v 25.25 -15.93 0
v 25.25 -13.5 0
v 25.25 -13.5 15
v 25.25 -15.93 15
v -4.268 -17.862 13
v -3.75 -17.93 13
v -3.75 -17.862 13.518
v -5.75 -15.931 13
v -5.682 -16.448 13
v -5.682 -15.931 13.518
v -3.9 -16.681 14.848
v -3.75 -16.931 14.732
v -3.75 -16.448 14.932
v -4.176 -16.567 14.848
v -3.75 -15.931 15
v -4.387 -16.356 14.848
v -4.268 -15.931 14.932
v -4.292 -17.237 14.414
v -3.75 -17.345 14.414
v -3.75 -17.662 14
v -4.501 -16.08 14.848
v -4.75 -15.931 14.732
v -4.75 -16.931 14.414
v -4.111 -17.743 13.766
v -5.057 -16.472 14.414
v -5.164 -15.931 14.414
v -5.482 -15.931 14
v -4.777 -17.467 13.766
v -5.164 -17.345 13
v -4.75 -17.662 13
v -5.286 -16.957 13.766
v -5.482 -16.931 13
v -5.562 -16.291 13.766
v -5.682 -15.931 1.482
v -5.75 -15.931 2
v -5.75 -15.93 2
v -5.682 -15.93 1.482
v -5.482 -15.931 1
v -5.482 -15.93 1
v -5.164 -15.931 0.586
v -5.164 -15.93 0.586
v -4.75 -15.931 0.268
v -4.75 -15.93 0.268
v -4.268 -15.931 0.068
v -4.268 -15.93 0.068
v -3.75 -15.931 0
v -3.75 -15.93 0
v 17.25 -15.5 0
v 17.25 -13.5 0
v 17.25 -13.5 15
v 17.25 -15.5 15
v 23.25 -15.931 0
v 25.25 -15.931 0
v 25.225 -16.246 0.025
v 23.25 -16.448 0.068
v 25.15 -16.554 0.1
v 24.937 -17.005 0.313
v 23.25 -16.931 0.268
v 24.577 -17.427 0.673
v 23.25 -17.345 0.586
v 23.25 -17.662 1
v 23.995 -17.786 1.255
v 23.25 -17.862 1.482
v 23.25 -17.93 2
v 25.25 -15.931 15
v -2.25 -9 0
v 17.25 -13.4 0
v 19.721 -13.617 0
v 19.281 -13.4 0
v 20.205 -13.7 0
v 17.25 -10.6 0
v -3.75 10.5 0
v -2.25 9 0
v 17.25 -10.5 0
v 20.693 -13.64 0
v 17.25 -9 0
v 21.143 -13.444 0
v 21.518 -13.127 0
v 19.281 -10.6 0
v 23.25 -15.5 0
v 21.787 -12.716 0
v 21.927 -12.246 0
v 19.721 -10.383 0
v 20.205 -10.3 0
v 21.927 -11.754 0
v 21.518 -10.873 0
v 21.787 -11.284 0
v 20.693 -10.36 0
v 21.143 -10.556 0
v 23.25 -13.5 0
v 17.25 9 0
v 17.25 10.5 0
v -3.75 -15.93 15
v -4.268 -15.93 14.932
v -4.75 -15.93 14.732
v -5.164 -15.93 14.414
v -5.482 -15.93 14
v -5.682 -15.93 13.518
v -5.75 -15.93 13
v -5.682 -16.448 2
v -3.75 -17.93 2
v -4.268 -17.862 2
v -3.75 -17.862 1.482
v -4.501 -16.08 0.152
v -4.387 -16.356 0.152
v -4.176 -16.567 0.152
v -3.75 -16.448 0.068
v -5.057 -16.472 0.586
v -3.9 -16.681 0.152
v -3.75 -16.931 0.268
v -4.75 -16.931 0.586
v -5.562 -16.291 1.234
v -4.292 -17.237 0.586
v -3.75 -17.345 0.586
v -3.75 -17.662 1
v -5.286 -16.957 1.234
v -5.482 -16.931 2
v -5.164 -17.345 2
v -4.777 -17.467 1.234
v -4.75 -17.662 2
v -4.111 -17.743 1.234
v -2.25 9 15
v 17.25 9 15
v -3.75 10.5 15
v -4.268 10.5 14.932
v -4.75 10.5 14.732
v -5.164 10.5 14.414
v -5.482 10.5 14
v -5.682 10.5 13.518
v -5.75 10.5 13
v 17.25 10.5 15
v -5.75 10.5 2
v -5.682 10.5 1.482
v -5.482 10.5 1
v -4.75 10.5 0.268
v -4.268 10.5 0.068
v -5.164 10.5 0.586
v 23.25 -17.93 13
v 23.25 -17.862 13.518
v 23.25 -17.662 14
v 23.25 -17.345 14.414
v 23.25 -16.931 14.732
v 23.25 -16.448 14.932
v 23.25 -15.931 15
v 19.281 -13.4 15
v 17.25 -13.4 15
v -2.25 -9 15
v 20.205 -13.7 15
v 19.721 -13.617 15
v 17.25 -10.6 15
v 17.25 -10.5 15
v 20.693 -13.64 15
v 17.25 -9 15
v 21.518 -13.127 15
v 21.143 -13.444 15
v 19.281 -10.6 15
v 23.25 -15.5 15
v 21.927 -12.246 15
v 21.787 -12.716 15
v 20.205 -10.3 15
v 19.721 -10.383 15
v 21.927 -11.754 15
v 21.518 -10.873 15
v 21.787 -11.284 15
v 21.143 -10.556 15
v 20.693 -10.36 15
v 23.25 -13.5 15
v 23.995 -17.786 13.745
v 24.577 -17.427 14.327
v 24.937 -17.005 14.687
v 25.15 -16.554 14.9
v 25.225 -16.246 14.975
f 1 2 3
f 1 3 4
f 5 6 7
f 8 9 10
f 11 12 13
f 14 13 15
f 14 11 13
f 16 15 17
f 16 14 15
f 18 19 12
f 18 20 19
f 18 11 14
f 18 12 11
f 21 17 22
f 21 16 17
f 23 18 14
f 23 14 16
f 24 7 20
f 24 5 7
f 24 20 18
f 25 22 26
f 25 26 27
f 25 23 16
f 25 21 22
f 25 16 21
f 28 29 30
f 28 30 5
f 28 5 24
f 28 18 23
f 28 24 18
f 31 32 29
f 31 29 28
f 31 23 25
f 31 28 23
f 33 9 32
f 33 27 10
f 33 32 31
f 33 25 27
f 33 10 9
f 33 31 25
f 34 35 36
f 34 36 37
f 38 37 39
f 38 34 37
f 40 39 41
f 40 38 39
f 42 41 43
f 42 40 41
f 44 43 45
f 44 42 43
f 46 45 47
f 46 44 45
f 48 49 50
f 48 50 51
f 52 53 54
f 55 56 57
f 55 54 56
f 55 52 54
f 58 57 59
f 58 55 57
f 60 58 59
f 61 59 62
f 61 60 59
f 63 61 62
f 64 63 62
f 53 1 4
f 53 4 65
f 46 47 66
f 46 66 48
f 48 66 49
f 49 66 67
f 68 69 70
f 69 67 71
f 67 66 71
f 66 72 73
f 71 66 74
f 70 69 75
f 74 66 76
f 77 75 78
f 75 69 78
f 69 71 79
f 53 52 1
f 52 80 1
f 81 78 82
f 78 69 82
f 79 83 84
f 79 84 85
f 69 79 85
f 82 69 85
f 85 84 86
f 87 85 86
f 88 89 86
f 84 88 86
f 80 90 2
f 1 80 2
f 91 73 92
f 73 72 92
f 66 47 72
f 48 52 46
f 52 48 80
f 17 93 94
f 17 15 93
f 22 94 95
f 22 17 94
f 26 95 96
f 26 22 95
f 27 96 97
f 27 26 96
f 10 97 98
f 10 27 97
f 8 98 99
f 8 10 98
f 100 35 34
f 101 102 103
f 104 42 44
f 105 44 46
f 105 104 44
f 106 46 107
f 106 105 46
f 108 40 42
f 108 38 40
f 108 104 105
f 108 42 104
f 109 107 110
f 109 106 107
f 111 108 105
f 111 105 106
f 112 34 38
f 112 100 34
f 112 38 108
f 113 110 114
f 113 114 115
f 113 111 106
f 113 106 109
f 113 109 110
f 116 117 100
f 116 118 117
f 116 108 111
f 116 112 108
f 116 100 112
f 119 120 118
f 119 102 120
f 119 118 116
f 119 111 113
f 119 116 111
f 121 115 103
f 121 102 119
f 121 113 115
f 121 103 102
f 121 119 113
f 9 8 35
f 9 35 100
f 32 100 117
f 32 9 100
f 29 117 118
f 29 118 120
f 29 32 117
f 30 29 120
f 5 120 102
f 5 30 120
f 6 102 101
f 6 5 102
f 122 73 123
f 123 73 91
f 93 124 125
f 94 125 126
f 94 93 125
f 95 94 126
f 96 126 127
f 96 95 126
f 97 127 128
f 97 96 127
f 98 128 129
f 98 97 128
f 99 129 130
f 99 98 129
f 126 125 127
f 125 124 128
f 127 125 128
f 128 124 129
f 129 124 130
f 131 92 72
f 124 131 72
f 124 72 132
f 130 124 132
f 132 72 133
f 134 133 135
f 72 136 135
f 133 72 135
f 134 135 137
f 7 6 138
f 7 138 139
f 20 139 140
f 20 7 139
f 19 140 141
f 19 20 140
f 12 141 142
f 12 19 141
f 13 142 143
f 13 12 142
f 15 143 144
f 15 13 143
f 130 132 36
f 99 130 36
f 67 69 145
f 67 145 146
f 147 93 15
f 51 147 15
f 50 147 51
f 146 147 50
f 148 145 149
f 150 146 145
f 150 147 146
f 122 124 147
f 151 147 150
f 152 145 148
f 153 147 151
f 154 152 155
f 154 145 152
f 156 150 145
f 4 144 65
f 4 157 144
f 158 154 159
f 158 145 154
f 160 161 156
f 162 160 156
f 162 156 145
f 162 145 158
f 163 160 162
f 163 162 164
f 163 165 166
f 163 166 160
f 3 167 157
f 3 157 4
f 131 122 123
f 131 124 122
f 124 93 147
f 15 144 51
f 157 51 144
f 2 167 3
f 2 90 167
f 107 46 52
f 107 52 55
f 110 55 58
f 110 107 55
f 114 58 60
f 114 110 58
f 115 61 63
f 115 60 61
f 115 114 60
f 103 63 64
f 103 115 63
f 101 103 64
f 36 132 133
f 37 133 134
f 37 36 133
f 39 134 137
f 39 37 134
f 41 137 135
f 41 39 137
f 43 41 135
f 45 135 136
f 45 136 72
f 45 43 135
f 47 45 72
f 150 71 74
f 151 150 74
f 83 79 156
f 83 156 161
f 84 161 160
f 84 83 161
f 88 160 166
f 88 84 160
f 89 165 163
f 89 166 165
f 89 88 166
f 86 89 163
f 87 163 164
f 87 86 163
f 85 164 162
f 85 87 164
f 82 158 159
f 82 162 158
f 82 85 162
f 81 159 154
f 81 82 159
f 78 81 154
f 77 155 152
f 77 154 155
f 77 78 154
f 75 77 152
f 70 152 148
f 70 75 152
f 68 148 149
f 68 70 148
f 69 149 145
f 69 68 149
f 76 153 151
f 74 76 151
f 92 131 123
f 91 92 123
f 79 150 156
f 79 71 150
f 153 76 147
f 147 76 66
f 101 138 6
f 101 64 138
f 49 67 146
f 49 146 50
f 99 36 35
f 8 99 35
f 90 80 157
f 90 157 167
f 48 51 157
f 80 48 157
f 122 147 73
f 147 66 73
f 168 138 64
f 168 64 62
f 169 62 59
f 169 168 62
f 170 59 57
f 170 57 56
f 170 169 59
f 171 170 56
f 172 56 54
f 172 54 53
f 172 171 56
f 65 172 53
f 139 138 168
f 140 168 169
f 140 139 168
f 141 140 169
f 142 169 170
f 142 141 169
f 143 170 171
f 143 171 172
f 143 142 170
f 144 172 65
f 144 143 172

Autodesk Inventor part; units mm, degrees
ref_plane "YZ Plane" through (0, 0, 0) normal (1, 0, 0) x (0, 1, 0)
ref_plane "XZ Plane" through (0, 0, 0) normal (0, 1, 0) x (-1, 0, 0)
ref_plane "XY Plane" through (0, 0, 0) normal (0, 0, 1) x (1, 0, 0)
sketch "Эскиз1" plane through (0, 0, 0) normal (0, 0, 1) x (1, 0, 0)
  arc A0 (19.25, -13.5) -> (19.25, -10.5) centre (20.245, -12) ccw projected
  line L0 (19.25, -10.5) -> (17.25, -10.5) projected
  line L1 (17.25, -13.5) -> (19.25, -13.5) projected
  line L2 (17.25, -10.6) -> (19.2806, -10.6)
  arc A1 (19.2806, -13.4) -> (19.2806, -10.6) centre (20.245, -12) ccw
  line L3 (19.2806, -13.4) -> (17.25, -13.4)
  line L4 (17.25, -13.5) -> (17.25, -15.5) projected
  line L5 (17.25, 3) -> (17.25, -10.5) projected
  line L6 (19.25, -9) -> (-2.25, -9) projected
  line L7 (-2.25, -9) -> (-2.25, 9) projected
  line L8 (-2.25, 9) -> (19.25, 9) projected
  line L9 (17.25, 10.5) -> (17.25, 6.5) projected
  line L10 (17.25, 10.5) -> (-5.75, 10.5)
  line L11 (-5.75, 10.5) -> (-5.75, -17.9303)
  line L12 (23.25, -17.9303) -> (-3.75, -17.9303) projected
  line L13 (-5.75, -15.9303) -> (-5.75, 10.5) projected
  line L14 (-5.75, -17.9303) -> (-3.75, -17.9303)
  line L15 (25.25, -13.5) -> (25.25, -15.9303) projected
  line L16 (23.25, -13.5) -> (25.25, -13.5) projected
  line L17 (23.25, -15.5) -> (23.25, -13.5) projected
  line L18 (23.25, -17.9303) -> (-3.75, -17.9303) projected
  line L19 (25.25, -15.9303) -> (25.25, -17.9303)
  line L20 (25.25, -17.9303) -> (23.25, -17.9303)
  line L21 (17.25, -15.5) -> (23.25, -15.5)
  line L22 (17.25, -13.4) -> (17.25, -13.5)
  line L23 (17.25, -10.6) -> (17.25, -10.5)
  point P0 (0, 0)
  point P1 (17.25, -9)
  point P2 (17.25, 9)
  dimension "d0" = 0.1
  dimension "d1" = 23
extrude "Выдавливание1" add sketch "Эскиз1" along normal blind 15 contours L4 L21 L17 L16 L15 L19 L20 L12 L14 L11 L10 L9 L8 L7 L6 L5 L23 L2 A1 L3 L22
fillet "Сопряжение1" radius 2 6 edges at (-5.75, -17.9303, 7.5) (-5.75, -3.7151, 0) (-5.75, -3.7151, 15) (9.75, -17.9303, 0) (9.75, -17.9303, 15) (25.25, -17.9303, 7.5)
properties part number "ЛЦМК.30000.10.00.02 Крышка задняя"
